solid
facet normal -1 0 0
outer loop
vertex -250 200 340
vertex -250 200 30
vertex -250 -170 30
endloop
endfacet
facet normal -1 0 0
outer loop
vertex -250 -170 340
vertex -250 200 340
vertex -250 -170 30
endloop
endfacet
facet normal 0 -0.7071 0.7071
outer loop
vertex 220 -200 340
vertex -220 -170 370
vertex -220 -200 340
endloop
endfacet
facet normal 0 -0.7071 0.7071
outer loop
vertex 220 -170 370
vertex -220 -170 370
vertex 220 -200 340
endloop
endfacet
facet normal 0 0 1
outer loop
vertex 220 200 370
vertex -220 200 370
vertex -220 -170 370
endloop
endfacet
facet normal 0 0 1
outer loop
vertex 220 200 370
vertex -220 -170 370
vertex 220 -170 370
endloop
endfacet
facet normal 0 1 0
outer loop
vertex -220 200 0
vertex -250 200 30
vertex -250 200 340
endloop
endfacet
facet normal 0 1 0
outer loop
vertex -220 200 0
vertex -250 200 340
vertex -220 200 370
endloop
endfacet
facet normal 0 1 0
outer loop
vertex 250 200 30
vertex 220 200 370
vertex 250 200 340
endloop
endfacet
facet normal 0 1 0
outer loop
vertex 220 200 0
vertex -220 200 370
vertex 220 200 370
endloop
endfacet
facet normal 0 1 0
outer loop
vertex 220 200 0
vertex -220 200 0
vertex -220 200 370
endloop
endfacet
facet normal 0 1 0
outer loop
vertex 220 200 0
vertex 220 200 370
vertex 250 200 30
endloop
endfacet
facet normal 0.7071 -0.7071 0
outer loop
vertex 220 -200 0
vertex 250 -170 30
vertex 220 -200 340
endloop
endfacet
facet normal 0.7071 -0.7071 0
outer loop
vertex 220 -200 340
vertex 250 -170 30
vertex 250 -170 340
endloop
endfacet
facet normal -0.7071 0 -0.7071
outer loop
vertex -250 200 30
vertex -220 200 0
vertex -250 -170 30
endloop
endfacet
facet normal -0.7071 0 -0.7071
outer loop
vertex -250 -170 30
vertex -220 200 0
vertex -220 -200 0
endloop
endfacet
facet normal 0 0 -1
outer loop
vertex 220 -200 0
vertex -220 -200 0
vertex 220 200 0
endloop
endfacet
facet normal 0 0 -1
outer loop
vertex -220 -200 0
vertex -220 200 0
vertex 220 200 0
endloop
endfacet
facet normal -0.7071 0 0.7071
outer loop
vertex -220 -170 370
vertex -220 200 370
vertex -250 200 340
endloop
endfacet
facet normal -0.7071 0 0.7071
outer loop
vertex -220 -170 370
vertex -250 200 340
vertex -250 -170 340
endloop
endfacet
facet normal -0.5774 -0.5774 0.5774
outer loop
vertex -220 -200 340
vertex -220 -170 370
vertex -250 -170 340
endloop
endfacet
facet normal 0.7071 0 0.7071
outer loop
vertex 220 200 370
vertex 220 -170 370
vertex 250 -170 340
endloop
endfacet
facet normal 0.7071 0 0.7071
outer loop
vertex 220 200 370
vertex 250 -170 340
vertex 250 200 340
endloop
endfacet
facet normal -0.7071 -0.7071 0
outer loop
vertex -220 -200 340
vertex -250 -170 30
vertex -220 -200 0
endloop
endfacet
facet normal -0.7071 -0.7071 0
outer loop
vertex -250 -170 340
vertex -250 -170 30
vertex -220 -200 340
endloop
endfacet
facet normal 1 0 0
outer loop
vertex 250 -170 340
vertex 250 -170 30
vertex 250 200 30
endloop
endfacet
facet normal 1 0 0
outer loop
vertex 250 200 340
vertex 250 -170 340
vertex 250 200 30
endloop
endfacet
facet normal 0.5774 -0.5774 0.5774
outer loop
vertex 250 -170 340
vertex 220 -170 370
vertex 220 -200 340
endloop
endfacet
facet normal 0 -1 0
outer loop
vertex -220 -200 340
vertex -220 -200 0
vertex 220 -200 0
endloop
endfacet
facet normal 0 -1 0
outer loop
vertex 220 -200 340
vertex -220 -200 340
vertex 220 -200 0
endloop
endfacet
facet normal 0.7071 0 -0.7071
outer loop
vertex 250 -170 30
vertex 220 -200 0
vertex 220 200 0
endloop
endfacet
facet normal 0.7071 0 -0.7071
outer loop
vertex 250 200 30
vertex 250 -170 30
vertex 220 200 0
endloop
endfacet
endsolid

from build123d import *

# Parameters (mm, degrees)
F0_W     = 500
F0_H     = 350
F0_H_2   = 50
F1_DEPTH = 370
F2_SIZE  = 30


with BuildPart() as f1:
    # F0 (on Top) → F1 (new body)
    with BuildSketch(Plane.XY):
        with Locations((0, -25)):
            Rectangle(F0_W, F0_H)
        with Locations((0, 175)):
            Rectangle(F0_W, F0_H_2)
    extrude(amount=F1_DEPTH)

    # F2
    f2_edges = [f1.edges().sort_by_distance(p)[0] for p in [
        (-250, 0, 370),
        (0, -200, 370),
        (250, 0, 370),
        (-250, -200, 185),
        (250, -200, 185),
        (250, 0, 0),
        (-250, 0, 0),
    ]]
    chamfer(f2_edges, length=F2_SIZE)


solid = f1.part
